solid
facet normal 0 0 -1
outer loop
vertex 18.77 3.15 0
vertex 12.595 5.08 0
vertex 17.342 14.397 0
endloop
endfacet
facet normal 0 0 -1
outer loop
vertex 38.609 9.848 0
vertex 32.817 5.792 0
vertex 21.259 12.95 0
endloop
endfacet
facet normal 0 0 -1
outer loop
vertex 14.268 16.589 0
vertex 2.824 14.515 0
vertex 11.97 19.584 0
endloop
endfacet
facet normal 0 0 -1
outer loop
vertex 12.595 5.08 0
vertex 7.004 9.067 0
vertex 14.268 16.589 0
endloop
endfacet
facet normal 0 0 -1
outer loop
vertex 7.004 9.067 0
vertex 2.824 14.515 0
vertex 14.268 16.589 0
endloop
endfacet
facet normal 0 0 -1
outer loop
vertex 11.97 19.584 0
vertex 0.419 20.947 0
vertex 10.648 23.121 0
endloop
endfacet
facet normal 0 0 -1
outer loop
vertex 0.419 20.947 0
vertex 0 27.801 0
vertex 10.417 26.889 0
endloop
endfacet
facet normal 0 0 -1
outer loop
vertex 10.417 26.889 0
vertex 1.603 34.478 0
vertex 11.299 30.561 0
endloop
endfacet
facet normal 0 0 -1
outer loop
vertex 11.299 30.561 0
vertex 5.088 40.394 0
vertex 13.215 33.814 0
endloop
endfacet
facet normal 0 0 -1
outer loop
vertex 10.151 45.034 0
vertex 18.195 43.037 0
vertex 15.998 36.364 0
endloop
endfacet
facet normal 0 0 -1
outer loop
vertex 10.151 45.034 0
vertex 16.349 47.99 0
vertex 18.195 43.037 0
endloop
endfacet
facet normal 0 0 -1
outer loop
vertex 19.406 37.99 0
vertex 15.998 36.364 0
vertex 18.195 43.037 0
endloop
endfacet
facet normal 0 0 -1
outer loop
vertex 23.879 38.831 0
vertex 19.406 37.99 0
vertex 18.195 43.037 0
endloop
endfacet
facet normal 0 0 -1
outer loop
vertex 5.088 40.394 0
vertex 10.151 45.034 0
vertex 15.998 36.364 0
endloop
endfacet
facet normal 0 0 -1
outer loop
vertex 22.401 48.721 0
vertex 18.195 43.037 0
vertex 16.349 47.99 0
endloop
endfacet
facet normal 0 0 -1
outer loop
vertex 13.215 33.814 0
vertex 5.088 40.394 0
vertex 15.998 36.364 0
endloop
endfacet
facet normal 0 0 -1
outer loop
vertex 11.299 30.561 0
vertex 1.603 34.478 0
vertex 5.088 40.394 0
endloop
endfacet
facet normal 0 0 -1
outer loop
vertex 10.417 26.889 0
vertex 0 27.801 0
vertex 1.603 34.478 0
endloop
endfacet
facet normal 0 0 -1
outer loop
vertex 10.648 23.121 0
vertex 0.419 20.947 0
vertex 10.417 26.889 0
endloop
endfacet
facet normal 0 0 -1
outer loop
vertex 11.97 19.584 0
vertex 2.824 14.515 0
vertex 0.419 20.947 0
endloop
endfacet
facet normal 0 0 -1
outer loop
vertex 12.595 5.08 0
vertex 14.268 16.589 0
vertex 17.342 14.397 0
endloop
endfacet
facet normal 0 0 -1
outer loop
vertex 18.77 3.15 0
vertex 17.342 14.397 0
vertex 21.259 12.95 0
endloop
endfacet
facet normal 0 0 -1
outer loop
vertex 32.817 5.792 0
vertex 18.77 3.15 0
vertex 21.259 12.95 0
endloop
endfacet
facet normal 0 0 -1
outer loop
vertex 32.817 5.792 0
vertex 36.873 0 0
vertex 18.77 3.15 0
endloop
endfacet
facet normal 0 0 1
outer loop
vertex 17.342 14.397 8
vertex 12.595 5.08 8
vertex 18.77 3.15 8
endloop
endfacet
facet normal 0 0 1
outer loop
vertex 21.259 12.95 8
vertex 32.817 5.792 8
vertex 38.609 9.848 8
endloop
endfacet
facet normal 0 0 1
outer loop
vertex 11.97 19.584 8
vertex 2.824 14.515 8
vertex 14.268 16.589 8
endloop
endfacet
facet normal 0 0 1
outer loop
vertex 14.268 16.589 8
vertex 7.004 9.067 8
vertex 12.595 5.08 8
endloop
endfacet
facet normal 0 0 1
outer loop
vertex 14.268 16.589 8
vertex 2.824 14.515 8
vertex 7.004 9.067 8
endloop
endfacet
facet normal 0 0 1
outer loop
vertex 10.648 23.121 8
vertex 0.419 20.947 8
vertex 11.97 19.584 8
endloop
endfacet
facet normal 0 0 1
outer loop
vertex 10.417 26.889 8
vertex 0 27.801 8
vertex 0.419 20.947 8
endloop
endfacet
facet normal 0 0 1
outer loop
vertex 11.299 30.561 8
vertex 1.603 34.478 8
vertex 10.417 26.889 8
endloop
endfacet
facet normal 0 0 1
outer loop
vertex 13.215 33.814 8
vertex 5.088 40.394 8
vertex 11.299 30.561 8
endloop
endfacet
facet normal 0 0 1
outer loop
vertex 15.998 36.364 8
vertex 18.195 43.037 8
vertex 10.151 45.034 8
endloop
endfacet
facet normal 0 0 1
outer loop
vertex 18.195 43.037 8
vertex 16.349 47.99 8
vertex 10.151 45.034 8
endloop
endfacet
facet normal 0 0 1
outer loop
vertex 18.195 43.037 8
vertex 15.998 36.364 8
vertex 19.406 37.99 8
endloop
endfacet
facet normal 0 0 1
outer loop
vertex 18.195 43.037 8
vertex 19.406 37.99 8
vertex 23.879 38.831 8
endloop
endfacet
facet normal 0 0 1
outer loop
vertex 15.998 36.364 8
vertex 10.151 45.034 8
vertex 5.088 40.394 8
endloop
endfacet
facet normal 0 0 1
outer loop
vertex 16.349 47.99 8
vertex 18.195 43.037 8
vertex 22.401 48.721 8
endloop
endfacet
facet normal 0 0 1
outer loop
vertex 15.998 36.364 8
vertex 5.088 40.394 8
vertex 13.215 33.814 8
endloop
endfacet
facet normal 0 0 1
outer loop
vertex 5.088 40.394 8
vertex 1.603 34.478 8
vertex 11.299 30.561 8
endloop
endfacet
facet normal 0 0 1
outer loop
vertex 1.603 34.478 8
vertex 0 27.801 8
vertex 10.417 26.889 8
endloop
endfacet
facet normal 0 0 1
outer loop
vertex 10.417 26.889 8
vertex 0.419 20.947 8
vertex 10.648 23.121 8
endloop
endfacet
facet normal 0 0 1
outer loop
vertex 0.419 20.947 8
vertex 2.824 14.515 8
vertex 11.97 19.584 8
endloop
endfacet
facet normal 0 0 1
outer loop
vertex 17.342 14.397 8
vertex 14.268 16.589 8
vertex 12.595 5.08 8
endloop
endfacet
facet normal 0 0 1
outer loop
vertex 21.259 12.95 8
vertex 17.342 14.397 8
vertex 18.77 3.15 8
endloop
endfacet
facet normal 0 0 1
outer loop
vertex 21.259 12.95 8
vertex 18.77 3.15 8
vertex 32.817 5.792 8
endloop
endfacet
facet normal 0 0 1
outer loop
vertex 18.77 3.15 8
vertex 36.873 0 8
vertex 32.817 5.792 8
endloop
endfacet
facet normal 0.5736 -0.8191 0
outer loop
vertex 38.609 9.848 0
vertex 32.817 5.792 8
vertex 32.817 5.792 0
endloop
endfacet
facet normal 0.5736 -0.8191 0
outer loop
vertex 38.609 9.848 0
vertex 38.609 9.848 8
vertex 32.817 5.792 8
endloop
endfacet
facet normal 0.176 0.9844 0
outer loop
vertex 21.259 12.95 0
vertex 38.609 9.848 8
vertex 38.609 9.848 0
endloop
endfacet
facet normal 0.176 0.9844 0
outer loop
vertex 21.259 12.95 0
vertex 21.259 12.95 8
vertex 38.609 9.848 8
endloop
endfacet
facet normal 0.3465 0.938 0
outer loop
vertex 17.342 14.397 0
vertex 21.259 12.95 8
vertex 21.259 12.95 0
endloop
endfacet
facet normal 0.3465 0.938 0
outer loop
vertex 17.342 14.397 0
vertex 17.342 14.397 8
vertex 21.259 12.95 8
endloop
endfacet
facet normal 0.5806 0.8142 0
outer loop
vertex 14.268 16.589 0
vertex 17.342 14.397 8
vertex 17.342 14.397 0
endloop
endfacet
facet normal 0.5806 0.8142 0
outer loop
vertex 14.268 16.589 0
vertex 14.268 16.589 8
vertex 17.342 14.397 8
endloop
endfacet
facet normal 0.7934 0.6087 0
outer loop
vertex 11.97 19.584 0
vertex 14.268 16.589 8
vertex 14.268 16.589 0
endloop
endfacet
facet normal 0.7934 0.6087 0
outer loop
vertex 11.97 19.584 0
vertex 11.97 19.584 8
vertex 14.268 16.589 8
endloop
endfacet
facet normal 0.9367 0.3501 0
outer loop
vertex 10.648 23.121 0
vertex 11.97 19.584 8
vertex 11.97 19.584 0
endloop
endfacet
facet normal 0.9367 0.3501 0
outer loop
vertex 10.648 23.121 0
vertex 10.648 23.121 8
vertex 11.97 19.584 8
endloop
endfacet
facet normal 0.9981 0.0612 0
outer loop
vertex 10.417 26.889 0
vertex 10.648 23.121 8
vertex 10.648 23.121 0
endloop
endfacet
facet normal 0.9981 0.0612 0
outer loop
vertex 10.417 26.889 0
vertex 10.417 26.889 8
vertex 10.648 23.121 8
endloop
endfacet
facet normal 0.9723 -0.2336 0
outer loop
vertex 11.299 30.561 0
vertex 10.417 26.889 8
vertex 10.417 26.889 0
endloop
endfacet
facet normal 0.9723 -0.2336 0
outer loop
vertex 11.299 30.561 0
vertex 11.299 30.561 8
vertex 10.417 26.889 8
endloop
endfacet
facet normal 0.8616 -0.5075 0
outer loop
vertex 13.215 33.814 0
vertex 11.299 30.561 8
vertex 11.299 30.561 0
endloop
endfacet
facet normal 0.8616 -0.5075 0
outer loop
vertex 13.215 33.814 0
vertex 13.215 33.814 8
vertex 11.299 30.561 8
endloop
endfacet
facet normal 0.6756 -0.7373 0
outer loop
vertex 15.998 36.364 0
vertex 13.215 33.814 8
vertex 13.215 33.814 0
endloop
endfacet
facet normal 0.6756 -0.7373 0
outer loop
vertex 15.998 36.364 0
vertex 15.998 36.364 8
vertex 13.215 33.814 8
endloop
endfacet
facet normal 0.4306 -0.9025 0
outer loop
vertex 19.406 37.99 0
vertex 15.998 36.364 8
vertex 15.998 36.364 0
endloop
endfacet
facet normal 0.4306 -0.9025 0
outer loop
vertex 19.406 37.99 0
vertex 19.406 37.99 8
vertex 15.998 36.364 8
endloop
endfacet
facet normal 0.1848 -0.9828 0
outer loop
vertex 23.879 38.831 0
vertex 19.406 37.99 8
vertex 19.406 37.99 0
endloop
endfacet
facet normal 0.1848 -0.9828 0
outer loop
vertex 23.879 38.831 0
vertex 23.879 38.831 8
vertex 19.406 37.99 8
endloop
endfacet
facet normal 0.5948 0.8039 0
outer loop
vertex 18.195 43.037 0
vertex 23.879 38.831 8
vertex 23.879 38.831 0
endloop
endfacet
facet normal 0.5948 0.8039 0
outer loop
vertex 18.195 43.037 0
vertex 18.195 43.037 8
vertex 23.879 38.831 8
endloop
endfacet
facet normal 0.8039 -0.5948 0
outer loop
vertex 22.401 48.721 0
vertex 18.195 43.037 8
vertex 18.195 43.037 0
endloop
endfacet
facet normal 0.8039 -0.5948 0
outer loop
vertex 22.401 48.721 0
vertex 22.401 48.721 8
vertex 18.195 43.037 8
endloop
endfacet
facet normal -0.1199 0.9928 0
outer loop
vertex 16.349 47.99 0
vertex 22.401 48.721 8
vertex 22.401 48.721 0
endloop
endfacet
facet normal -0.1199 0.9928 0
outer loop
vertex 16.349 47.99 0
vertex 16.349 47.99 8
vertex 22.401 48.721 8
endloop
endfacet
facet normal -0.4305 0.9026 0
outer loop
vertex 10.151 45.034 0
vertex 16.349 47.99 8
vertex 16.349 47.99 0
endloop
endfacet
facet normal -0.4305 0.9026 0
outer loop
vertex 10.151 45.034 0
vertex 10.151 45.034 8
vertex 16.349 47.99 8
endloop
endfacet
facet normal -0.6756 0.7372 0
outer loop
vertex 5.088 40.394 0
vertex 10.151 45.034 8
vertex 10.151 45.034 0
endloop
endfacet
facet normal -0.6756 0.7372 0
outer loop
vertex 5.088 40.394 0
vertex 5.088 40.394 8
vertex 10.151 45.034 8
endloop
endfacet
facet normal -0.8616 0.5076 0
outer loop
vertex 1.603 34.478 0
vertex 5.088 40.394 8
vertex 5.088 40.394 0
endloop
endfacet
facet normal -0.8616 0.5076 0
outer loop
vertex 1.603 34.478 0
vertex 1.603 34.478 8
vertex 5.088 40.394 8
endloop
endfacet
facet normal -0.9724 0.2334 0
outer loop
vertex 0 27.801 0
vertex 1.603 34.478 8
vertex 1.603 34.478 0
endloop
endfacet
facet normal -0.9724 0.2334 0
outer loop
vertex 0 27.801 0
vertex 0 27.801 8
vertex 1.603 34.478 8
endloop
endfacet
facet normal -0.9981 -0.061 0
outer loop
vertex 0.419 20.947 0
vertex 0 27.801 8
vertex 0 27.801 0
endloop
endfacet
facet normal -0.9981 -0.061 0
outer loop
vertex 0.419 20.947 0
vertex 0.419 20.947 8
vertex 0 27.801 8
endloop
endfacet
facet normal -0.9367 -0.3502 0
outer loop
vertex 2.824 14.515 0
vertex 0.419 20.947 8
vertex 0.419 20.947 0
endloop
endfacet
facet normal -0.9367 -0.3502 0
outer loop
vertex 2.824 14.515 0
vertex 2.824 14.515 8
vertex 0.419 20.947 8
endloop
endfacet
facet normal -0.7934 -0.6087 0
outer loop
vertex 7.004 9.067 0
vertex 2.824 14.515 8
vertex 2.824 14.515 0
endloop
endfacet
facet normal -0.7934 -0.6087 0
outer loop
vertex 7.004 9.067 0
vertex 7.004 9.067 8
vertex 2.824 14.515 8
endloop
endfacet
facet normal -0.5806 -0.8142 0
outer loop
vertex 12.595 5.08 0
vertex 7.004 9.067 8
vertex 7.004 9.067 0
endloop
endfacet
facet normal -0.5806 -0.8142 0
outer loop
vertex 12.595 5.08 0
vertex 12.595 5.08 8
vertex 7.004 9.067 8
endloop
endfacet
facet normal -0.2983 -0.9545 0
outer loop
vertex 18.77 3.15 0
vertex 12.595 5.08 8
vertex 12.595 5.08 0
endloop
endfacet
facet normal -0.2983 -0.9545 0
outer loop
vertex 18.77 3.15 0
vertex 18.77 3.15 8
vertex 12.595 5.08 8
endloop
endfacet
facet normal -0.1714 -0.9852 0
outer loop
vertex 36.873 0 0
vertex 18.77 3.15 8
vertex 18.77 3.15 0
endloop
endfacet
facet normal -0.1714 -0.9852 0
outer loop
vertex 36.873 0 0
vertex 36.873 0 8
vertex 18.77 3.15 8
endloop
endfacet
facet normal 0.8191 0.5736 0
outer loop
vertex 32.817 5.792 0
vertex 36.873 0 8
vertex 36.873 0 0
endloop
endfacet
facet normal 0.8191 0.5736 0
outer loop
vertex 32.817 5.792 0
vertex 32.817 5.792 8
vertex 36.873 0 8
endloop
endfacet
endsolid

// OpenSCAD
$fn = 32;

// ----------------------------------------------------------------------
// Hook plate: curl radius 18 mm over 170 degrees, 10 mm thick band
// ----------------------------------------------------------------------

// --- parameters (mm) ---
profile_height = 8;       // extrusion height
profile_points = 26;      // points of the closed outline

profile = [[18.195, 43.037], [22.401, 48.721], [16.349, 47.99], [10.151, 45.034], [5.088, 40.394], [1.603, 34.478], [0, 27.801], [0.419, 20.947], [2.824, 14.515], [7.004, 9.067], [12.595, 5.08], [18.77, 3.15], [36.873, 0], [32.817, 5.792], [38.609, 9.848], [21.259, 12.95], [17.342, 14.397], [14.268, 16.589], [11.97, 19.584], [10.648, 23.121], [10.417, 26.889], [11.299, 30.561], [13.215, 33.814], [15.998, 36.364], [19.406, 37.99], [23.879, 38.831]];  // single closed polygon, 26 points, counter clockwise

// --- the one profile operation ---
linear_extrude(height = profile_height) polygon(points = profile);
